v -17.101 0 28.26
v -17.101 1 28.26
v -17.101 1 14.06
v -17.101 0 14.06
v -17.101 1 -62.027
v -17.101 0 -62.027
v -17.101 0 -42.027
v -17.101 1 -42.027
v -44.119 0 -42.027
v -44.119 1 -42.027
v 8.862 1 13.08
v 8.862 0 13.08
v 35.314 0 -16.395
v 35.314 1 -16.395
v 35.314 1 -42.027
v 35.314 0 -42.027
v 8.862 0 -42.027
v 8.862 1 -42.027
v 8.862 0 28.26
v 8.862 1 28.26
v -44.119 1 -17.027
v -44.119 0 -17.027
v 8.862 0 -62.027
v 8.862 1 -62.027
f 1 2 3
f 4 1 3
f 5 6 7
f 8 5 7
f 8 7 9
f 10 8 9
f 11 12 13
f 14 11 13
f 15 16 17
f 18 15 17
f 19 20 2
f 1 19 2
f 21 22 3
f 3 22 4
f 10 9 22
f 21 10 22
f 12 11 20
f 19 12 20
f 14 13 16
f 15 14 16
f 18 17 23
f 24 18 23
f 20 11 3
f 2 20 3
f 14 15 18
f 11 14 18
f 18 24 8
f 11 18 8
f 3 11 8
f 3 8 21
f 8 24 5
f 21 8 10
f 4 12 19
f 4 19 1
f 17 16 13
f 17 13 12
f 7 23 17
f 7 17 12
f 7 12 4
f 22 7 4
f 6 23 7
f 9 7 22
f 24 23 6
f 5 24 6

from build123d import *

# Parameters (mm, degrees)
BOSS_EXTRUDE1_DEPTH = 1
BOSS_EXTRUDE2_DEPTH = 1


with BuildPart() as part:
    # Sketch1 → Boss-Extrude1 (new body)
    with BuildSketch(Plane(origin=(0, 0, 0), x_dir=(1, 0, 0), z_dir=(0, 1, 0))):
        Polygon((-17.101249567, 62.026712282), (-17.101249567, 42.026712282), (-44.119439114, 42.026712282), (-44.119439114, 17.026712282), (-4.760262303, -28.259656537), (35.313890805, 16.395267634), (35.313890805, 42.026712282), (8.862371339, 42.026712282), (8.862371339, 62.026712282), align=None)
    extrude(amount=BOSS_EXTRUDE1_DEPTH)

    # Sketch2 → Boss-Extrude2 (add)
    with BuildSketch(Plane(origin=(0, 1, 0), x_dir=(1, 0, 0), z_dir=(0, 1, 0))):
        Polygon((8.862371339, -28.259656537), (-17.101249567, -28.259656537), (-17.101249567, 42.026712282), (8.862371339, 62.026712282), align=None)
    extrude(amount=-BOSS_EXTRUDE2_DEPTH)


solid = part.part
